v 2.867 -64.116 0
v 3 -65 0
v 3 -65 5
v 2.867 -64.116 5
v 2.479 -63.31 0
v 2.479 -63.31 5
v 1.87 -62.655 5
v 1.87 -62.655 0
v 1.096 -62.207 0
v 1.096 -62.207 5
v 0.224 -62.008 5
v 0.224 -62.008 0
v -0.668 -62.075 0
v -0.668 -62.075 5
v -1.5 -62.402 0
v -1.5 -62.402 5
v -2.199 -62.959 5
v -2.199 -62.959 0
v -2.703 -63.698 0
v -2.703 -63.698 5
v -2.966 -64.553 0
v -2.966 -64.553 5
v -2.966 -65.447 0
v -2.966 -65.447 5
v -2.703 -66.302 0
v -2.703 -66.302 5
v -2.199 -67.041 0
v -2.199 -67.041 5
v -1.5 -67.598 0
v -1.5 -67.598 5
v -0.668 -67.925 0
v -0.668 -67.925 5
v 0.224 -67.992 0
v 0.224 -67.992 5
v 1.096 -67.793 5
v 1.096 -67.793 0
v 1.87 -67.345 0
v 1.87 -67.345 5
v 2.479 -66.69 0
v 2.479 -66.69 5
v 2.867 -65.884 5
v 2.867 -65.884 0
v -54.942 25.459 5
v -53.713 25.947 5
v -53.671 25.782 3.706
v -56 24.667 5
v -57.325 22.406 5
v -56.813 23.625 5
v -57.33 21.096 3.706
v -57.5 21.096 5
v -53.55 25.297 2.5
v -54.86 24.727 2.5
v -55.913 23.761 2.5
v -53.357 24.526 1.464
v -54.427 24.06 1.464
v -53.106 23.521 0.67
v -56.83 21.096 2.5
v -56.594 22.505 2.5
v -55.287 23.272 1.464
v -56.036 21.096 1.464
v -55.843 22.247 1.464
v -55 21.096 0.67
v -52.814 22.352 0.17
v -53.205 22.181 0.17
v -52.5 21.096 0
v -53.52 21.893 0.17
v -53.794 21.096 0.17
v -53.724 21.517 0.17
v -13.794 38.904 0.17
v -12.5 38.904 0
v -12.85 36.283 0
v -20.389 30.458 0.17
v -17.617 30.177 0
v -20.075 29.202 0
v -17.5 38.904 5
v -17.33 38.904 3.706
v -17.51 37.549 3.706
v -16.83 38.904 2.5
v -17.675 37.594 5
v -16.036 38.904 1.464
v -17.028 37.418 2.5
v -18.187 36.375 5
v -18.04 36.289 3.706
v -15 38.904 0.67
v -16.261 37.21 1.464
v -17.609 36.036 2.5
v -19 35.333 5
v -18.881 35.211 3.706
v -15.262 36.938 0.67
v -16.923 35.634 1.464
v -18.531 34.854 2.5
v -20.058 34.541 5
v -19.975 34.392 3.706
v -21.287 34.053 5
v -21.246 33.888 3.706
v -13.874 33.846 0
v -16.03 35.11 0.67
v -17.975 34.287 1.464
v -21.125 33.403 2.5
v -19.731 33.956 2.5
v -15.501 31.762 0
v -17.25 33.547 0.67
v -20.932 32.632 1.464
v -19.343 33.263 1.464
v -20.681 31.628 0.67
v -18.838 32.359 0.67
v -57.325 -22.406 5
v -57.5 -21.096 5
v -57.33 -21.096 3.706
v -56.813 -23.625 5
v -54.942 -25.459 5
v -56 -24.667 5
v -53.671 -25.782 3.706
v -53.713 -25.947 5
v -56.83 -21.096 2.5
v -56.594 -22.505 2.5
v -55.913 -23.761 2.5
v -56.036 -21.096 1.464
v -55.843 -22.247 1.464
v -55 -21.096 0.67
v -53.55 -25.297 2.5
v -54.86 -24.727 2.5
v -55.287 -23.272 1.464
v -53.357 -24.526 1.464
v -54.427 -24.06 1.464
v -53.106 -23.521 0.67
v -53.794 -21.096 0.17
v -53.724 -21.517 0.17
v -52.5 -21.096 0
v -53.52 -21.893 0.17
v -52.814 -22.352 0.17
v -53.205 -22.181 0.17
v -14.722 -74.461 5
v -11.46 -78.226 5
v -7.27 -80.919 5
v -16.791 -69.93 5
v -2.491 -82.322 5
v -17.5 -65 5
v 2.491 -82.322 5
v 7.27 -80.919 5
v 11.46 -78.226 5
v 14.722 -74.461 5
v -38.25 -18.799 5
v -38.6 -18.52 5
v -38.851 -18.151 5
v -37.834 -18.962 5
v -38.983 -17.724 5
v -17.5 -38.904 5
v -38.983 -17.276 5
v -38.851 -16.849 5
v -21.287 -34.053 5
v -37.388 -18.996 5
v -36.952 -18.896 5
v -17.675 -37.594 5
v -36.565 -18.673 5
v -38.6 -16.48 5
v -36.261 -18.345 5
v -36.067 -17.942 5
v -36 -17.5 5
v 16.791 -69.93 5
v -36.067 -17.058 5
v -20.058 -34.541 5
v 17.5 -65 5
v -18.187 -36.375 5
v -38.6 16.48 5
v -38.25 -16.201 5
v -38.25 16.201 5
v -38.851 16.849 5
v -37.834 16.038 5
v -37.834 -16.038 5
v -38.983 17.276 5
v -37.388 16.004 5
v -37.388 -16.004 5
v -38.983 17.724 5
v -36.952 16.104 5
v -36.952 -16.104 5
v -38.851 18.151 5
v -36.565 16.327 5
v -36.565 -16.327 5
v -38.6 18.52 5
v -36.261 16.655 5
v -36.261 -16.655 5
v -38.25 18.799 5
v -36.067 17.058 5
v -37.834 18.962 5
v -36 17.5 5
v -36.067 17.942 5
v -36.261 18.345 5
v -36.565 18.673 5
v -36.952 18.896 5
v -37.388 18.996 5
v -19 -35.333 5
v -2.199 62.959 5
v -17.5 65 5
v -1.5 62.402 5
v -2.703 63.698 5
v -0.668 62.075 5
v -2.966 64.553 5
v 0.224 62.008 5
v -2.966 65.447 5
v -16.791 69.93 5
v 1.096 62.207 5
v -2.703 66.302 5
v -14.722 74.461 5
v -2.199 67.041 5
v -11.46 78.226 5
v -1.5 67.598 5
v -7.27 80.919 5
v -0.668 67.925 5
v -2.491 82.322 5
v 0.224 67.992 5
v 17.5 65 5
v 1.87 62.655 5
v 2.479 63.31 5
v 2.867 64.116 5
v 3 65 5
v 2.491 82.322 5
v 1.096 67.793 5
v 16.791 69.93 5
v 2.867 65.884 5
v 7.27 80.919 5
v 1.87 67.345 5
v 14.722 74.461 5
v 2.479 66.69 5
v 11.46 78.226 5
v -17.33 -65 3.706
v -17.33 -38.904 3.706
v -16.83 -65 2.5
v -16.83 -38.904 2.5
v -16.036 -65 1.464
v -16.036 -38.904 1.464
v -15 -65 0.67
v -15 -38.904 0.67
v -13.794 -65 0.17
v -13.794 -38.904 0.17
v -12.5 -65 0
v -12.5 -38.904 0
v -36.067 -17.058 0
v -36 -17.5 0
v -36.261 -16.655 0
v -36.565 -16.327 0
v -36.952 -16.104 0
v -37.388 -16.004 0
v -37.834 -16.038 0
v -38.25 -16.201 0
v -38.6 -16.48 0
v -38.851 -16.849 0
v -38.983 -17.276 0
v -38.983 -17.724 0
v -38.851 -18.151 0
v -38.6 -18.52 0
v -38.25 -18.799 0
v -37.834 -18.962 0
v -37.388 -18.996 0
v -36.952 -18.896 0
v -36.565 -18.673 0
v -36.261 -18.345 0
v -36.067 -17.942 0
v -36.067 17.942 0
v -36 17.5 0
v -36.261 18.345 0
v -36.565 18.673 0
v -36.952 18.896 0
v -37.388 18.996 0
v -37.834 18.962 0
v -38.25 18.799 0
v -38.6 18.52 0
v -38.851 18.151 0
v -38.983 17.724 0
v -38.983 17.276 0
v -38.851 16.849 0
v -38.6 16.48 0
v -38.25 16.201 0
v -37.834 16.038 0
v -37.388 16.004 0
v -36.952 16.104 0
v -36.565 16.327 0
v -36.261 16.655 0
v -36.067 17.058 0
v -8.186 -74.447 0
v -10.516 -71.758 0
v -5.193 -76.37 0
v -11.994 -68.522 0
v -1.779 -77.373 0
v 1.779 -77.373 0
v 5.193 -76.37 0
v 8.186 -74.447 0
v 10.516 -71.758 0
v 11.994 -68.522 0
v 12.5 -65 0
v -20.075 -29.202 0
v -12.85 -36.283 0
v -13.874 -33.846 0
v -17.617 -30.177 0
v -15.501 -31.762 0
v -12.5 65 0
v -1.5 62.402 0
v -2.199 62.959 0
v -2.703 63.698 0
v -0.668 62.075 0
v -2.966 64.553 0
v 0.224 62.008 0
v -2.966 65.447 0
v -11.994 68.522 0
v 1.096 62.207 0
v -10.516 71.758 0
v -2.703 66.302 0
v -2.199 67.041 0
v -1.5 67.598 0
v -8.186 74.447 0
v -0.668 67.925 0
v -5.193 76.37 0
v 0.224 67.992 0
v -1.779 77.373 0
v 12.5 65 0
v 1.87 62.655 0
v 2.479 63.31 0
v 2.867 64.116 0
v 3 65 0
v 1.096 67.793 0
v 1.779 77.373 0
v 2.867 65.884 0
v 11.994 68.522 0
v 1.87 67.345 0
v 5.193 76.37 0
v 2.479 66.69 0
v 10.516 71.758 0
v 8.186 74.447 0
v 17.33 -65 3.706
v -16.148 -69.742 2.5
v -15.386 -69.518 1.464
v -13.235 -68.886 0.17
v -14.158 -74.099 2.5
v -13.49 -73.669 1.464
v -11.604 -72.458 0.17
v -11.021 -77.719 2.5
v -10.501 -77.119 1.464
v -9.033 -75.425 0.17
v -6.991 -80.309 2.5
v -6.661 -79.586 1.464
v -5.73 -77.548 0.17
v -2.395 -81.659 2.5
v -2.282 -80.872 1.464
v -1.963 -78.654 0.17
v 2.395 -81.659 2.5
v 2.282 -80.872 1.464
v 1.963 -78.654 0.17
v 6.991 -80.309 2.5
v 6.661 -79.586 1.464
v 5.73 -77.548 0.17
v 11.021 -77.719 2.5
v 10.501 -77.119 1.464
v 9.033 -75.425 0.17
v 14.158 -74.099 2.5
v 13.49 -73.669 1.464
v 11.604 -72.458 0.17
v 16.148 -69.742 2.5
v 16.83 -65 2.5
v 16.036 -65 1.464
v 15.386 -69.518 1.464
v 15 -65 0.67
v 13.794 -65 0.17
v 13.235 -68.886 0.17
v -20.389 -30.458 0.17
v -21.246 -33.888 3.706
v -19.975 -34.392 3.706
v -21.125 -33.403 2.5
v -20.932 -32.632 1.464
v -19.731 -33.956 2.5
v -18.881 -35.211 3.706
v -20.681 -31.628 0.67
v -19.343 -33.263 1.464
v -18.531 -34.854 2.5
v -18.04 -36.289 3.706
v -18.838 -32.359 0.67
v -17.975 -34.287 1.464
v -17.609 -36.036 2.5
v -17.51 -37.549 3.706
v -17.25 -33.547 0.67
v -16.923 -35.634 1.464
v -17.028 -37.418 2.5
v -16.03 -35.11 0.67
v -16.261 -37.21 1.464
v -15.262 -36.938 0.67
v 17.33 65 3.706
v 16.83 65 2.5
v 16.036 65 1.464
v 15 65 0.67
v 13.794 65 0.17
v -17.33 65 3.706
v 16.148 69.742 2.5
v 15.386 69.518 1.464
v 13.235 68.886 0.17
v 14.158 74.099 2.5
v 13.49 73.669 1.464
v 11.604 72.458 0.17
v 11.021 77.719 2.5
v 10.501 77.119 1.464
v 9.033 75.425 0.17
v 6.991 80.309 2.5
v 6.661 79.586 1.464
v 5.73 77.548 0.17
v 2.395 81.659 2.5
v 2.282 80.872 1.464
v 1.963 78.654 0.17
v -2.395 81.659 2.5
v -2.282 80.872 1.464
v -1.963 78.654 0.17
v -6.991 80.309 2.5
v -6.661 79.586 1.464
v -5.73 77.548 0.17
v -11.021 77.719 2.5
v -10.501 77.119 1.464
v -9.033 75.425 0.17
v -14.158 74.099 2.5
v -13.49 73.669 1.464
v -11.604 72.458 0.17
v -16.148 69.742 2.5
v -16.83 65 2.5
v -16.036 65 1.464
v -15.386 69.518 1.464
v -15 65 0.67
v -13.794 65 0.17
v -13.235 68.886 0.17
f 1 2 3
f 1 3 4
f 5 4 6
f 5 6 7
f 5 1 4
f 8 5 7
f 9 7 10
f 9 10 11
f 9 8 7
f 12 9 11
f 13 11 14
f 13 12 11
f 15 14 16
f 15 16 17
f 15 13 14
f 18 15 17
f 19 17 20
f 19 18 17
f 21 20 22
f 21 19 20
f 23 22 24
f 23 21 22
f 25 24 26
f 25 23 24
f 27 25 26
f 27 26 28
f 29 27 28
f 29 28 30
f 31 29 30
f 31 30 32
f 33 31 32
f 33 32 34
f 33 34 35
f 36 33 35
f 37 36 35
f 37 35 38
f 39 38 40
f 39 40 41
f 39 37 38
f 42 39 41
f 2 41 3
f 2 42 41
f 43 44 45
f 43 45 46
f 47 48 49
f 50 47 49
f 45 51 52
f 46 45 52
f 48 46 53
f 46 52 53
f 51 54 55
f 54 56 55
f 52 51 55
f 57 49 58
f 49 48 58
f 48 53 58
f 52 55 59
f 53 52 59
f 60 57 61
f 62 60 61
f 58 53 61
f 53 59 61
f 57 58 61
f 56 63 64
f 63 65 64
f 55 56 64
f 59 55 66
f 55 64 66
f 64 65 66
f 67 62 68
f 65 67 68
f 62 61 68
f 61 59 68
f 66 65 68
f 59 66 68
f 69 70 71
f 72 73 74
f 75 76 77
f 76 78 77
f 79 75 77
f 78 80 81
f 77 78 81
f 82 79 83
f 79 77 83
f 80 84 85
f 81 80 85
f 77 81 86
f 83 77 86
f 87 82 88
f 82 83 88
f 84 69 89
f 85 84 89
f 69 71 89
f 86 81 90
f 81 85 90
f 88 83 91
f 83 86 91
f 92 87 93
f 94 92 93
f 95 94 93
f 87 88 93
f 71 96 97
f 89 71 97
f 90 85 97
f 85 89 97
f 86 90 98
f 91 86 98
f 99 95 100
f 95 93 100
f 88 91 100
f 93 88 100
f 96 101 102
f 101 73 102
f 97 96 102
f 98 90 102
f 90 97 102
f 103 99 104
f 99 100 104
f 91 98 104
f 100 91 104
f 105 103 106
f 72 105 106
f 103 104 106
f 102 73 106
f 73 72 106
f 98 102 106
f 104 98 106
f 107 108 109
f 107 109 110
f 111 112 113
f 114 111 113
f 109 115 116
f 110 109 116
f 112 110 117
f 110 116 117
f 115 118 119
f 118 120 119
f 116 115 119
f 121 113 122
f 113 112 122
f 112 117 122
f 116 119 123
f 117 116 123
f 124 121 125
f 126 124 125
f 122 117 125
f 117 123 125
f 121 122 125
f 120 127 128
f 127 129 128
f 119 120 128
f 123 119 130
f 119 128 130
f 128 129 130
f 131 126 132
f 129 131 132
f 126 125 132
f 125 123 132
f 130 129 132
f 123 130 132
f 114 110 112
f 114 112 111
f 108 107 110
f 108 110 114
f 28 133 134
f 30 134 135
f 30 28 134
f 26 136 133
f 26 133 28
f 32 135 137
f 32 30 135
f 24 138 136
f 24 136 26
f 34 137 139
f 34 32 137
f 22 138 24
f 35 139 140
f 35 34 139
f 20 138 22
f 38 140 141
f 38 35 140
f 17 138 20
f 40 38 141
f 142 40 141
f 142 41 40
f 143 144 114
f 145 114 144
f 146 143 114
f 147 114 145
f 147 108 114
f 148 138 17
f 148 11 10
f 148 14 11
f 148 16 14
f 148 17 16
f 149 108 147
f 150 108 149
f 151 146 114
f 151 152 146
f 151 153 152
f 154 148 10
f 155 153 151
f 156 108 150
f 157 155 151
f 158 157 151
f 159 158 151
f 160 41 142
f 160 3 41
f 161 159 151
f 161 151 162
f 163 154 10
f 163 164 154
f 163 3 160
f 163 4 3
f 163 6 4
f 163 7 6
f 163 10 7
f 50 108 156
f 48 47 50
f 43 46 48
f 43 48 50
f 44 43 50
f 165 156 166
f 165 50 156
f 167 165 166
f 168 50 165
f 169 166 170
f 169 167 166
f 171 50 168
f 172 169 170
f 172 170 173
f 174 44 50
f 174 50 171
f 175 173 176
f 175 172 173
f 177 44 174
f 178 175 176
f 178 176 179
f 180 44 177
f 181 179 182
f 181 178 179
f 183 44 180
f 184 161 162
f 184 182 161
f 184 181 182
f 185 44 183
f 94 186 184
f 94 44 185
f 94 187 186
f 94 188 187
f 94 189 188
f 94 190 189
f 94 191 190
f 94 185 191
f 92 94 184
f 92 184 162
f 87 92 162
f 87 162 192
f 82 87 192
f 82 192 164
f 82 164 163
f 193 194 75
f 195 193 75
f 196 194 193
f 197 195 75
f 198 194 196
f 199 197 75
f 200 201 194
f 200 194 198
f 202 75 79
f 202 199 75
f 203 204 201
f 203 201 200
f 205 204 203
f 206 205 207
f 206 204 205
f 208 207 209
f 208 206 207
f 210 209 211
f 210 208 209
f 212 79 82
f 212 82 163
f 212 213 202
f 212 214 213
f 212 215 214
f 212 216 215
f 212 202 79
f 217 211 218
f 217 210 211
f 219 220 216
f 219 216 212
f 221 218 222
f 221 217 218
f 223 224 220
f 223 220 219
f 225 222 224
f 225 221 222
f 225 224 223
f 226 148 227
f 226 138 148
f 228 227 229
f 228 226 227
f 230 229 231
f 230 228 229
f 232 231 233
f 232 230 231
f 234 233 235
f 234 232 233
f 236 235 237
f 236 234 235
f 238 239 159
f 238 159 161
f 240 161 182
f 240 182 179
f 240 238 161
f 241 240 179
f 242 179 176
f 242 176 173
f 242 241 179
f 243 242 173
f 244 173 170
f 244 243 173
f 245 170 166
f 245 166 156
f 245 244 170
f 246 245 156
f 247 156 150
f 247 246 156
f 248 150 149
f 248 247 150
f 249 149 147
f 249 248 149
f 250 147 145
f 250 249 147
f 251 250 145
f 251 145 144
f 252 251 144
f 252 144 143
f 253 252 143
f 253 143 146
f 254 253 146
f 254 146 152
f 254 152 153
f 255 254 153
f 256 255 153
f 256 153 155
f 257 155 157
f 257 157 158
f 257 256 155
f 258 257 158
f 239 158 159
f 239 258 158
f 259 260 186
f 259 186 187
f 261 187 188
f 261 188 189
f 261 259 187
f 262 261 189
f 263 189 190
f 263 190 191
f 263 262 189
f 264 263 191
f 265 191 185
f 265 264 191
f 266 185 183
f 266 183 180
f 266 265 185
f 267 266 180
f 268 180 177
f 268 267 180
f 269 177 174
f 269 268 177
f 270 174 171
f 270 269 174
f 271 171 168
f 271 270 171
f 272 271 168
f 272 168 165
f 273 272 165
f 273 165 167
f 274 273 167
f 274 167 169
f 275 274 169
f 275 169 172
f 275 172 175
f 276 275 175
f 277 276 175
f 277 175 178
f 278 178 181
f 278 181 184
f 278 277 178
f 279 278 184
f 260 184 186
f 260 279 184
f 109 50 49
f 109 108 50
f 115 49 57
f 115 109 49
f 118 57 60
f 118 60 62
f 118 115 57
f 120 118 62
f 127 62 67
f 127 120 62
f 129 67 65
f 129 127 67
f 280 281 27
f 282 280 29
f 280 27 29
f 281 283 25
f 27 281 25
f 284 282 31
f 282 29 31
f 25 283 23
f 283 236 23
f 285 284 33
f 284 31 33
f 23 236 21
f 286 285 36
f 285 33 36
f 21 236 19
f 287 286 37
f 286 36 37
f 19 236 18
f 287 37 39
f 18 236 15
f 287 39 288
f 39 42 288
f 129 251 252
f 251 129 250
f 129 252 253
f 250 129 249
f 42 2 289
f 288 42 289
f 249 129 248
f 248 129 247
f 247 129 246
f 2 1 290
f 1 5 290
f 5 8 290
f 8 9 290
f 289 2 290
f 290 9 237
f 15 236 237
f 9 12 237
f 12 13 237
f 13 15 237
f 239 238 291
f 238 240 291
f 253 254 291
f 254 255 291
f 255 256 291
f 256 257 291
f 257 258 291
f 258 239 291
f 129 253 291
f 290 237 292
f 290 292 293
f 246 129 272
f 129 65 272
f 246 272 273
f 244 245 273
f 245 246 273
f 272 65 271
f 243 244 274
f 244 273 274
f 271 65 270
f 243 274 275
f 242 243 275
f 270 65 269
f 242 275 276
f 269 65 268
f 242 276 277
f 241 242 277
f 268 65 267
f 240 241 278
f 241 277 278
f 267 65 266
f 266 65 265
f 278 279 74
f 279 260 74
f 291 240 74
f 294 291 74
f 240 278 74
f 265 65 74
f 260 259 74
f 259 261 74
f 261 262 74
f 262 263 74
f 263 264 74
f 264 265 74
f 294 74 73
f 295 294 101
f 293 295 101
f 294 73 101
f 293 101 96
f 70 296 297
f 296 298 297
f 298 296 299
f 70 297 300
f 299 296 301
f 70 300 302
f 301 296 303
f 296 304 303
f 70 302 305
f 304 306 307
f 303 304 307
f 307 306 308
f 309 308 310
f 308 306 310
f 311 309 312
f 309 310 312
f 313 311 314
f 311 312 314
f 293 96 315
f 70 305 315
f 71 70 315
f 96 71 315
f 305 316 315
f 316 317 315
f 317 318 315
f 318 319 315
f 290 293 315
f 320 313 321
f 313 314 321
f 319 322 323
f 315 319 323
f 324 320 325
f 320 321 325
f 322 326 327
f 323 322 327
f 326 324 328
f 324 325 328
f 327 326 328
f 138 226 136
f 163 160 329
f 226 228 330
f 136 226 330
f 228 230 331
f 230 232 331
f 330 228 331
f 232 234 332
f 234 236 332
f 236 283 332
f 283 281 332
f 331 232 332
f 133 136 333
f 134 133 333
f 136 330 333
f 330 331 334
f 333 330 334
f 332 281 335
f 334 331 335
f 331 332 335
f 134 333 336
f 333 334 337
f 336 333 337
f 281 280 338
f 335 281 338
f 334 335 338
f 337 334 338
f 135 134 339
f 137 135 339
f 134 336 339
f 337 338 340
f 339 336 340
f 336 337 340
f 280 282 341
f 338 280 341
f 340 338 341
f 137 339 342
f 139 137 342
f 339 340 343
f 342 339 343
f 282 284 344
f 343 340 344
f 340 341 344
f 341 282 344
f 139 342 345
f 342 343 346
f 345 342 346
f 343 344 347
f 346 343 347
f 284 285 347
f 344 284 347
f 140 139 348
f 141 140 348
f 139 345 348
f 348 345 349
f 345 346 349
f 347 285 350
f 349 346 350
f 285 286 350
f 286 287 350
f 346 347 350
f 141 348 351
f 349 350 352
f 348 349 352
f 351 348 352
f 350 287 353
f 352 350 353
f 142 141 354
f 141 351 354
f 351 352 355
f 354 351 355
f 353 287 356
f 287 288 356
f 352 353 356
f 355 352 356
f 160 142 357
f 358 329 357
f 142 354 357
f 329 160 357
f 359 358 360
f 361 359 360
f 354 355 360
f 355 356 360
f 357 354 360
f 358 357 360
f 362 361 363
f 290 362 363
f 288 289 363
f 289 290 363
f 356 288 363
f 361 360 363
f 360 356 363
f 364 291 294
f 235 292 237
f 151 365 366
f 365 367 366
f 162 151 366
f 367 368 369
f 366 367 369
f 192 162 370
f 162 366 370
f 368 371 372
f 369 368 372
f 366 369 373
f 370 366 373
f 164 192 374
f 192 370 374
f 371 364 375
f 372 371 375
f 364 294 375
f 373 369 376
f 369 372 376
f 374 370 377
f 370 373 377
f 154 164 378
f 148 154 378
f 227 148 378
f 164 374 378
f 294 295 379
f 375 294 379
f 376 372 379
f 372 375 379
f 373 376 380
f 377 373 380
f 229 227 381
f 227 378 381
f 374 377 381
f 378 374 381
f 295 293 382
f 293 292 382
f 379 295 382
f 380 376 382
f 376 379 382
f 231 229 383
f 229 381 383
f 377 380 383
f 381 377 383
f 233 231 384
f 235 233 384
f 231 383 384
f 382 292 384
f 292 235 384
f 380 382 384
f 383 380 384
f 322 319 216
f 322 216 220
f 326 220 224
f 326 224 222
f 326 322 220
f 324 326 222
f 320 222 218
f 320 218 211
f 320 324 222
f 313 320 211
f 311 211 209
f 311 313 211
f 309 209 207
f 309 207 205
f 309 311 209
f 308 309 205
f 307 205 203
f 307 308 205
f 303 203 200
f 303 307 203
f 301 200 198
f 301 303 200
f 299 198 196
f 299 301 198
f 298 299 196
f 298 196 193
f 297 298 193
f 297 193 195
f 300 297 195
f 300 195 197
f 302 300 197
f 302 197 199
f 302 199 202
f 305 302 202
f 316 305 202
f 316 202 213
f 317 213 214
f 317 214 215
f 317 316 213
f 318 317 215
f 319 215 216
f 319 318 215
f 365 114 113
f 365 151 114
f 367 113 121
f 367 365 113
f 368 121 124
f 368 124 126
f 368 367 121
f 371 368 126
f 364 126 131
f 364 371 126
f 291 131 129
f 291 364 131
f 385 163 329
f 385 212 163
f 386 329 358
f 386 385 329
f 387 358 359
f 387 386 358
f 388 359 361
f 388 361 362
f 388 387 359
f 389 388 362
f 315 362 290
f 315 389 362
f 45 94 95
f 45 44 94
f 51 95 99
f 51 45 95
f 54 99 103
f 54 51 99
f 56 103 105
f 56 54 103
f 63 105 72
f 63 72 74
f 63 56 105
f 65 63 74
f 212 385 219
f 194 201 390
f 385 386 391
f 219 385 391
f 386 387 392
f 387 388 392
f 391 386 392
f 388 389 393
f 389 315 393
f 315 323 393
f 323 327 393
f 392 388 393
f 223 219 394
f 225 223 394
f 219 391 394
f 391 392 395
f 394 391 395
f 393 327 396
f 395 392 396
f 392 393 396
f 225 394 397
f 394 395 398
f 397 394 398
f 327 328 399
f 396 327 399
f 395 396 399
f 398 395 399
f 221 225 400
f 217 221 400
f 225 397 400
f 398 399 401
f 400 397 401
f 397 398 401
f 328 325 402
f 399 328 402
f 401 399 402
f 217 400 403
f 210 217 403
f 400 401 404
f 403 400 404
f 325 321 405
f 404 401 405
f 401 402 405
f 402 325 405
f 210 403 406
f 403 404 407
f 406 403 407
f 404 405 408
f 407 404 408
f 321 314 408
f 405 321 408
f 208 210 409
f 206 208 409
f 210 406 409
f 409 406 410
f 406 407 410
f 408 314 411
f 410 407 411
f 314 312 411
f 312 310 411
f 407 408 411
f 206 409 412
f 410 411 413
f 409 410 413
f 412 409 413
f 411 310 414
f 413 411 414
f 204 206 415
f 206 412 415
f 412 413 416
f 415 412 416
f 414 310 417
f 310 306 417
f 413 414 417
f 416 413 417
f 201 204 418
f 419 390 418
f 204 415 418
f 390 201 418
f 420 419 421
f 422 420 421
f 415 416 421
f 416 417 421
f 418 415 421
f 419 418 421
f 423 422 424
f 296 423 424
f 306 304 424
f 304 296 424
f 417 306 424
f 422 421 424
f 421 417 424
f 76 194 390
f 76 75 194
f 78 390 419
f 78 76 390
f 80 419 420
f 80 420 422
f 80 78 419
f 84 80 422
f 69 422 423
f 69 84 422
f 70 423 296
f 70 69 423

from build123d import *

# Parameters (mm, degrees)
F0_R     = 1.5
F0_R_2   = 3
F1_DEPTH = 5
F2_R     = 4.99999


# Not quite as in the source:
# - a fillet or chamfer is up to 0.001 mm smaller than in the source, because OpenCascade refuses the exact size


with BuildPart() as f1:
    # F0 (on Top) → F1 (new body)
    with BuildSketch(Plane.XY):
        with BuildLine():
            Line((17.5, -65), (17.5, 65))
            ThreePointArc((17.5, 65), (0, 82.5), (-17.5, 65))
            Line((-17.5, 65), (-17.5, 38.903882032))
            ThreePointArc((-17.5, 38.903882032), (-18.5589728099, 35.826820985), (-21.2873218748, 34.0531695313))
            Line((-21.2873218748, 34.0531695313), (-53.7126781252, 25.9468304687))
            ThreePointArc((-53.7126781252, 25.9468304687), (-56.4410271901, 24.173179015), (-57.5, 21.096117968))
            Line((-57.5, 21.096117968), (-57.5, -21.096117968))
            ThreePointArc((-57.5, -21.096117968), (-56.4410271901, -24.173179015), (-53.7126781252, -25.9468304687))
            Line((-53.7126781252, -25.9468304687), (-21.2873218748, -34.0531695313))
            ThreePointArc((-21.2873218748, -34.0531695313), (-18.5589728099, -35.826820985), (-17.5, -38.903882032))
            Line((-17.5, -38.903882032), (-17.5, -65))
            ThreePointArc((-17.5, -65), (0, -82.5), (17.5, -65))
        make_face()
        with Locations((-37.5, -17.5)):
            Circle(F0_R, mode=Mode.SUBTRACT)
        with Locations((0, -65)):
            Circle(F0_R_2, mode=Mode.SUBTRACT)
        with Locations((-37.5, 17.5)):
            Circle(F0_R, mode=Mode.SUBTRACT)
        with Locations((0, 65)):
            Circle(F0_R_2, mode=Mode.SUBTRACT)
    extrude(amount=F1_DEPTH)

    # F2 (radius 5 in the source; OpenCascade refuses exactly that, so slightly less here)
    f2_edges = [f1.edges().sort_by_distance(p)[0] for p in [
        (17.5, 0, 0),
    ]]
    fillet(f2_edges, radius=F2_R)


solid = f1.part
